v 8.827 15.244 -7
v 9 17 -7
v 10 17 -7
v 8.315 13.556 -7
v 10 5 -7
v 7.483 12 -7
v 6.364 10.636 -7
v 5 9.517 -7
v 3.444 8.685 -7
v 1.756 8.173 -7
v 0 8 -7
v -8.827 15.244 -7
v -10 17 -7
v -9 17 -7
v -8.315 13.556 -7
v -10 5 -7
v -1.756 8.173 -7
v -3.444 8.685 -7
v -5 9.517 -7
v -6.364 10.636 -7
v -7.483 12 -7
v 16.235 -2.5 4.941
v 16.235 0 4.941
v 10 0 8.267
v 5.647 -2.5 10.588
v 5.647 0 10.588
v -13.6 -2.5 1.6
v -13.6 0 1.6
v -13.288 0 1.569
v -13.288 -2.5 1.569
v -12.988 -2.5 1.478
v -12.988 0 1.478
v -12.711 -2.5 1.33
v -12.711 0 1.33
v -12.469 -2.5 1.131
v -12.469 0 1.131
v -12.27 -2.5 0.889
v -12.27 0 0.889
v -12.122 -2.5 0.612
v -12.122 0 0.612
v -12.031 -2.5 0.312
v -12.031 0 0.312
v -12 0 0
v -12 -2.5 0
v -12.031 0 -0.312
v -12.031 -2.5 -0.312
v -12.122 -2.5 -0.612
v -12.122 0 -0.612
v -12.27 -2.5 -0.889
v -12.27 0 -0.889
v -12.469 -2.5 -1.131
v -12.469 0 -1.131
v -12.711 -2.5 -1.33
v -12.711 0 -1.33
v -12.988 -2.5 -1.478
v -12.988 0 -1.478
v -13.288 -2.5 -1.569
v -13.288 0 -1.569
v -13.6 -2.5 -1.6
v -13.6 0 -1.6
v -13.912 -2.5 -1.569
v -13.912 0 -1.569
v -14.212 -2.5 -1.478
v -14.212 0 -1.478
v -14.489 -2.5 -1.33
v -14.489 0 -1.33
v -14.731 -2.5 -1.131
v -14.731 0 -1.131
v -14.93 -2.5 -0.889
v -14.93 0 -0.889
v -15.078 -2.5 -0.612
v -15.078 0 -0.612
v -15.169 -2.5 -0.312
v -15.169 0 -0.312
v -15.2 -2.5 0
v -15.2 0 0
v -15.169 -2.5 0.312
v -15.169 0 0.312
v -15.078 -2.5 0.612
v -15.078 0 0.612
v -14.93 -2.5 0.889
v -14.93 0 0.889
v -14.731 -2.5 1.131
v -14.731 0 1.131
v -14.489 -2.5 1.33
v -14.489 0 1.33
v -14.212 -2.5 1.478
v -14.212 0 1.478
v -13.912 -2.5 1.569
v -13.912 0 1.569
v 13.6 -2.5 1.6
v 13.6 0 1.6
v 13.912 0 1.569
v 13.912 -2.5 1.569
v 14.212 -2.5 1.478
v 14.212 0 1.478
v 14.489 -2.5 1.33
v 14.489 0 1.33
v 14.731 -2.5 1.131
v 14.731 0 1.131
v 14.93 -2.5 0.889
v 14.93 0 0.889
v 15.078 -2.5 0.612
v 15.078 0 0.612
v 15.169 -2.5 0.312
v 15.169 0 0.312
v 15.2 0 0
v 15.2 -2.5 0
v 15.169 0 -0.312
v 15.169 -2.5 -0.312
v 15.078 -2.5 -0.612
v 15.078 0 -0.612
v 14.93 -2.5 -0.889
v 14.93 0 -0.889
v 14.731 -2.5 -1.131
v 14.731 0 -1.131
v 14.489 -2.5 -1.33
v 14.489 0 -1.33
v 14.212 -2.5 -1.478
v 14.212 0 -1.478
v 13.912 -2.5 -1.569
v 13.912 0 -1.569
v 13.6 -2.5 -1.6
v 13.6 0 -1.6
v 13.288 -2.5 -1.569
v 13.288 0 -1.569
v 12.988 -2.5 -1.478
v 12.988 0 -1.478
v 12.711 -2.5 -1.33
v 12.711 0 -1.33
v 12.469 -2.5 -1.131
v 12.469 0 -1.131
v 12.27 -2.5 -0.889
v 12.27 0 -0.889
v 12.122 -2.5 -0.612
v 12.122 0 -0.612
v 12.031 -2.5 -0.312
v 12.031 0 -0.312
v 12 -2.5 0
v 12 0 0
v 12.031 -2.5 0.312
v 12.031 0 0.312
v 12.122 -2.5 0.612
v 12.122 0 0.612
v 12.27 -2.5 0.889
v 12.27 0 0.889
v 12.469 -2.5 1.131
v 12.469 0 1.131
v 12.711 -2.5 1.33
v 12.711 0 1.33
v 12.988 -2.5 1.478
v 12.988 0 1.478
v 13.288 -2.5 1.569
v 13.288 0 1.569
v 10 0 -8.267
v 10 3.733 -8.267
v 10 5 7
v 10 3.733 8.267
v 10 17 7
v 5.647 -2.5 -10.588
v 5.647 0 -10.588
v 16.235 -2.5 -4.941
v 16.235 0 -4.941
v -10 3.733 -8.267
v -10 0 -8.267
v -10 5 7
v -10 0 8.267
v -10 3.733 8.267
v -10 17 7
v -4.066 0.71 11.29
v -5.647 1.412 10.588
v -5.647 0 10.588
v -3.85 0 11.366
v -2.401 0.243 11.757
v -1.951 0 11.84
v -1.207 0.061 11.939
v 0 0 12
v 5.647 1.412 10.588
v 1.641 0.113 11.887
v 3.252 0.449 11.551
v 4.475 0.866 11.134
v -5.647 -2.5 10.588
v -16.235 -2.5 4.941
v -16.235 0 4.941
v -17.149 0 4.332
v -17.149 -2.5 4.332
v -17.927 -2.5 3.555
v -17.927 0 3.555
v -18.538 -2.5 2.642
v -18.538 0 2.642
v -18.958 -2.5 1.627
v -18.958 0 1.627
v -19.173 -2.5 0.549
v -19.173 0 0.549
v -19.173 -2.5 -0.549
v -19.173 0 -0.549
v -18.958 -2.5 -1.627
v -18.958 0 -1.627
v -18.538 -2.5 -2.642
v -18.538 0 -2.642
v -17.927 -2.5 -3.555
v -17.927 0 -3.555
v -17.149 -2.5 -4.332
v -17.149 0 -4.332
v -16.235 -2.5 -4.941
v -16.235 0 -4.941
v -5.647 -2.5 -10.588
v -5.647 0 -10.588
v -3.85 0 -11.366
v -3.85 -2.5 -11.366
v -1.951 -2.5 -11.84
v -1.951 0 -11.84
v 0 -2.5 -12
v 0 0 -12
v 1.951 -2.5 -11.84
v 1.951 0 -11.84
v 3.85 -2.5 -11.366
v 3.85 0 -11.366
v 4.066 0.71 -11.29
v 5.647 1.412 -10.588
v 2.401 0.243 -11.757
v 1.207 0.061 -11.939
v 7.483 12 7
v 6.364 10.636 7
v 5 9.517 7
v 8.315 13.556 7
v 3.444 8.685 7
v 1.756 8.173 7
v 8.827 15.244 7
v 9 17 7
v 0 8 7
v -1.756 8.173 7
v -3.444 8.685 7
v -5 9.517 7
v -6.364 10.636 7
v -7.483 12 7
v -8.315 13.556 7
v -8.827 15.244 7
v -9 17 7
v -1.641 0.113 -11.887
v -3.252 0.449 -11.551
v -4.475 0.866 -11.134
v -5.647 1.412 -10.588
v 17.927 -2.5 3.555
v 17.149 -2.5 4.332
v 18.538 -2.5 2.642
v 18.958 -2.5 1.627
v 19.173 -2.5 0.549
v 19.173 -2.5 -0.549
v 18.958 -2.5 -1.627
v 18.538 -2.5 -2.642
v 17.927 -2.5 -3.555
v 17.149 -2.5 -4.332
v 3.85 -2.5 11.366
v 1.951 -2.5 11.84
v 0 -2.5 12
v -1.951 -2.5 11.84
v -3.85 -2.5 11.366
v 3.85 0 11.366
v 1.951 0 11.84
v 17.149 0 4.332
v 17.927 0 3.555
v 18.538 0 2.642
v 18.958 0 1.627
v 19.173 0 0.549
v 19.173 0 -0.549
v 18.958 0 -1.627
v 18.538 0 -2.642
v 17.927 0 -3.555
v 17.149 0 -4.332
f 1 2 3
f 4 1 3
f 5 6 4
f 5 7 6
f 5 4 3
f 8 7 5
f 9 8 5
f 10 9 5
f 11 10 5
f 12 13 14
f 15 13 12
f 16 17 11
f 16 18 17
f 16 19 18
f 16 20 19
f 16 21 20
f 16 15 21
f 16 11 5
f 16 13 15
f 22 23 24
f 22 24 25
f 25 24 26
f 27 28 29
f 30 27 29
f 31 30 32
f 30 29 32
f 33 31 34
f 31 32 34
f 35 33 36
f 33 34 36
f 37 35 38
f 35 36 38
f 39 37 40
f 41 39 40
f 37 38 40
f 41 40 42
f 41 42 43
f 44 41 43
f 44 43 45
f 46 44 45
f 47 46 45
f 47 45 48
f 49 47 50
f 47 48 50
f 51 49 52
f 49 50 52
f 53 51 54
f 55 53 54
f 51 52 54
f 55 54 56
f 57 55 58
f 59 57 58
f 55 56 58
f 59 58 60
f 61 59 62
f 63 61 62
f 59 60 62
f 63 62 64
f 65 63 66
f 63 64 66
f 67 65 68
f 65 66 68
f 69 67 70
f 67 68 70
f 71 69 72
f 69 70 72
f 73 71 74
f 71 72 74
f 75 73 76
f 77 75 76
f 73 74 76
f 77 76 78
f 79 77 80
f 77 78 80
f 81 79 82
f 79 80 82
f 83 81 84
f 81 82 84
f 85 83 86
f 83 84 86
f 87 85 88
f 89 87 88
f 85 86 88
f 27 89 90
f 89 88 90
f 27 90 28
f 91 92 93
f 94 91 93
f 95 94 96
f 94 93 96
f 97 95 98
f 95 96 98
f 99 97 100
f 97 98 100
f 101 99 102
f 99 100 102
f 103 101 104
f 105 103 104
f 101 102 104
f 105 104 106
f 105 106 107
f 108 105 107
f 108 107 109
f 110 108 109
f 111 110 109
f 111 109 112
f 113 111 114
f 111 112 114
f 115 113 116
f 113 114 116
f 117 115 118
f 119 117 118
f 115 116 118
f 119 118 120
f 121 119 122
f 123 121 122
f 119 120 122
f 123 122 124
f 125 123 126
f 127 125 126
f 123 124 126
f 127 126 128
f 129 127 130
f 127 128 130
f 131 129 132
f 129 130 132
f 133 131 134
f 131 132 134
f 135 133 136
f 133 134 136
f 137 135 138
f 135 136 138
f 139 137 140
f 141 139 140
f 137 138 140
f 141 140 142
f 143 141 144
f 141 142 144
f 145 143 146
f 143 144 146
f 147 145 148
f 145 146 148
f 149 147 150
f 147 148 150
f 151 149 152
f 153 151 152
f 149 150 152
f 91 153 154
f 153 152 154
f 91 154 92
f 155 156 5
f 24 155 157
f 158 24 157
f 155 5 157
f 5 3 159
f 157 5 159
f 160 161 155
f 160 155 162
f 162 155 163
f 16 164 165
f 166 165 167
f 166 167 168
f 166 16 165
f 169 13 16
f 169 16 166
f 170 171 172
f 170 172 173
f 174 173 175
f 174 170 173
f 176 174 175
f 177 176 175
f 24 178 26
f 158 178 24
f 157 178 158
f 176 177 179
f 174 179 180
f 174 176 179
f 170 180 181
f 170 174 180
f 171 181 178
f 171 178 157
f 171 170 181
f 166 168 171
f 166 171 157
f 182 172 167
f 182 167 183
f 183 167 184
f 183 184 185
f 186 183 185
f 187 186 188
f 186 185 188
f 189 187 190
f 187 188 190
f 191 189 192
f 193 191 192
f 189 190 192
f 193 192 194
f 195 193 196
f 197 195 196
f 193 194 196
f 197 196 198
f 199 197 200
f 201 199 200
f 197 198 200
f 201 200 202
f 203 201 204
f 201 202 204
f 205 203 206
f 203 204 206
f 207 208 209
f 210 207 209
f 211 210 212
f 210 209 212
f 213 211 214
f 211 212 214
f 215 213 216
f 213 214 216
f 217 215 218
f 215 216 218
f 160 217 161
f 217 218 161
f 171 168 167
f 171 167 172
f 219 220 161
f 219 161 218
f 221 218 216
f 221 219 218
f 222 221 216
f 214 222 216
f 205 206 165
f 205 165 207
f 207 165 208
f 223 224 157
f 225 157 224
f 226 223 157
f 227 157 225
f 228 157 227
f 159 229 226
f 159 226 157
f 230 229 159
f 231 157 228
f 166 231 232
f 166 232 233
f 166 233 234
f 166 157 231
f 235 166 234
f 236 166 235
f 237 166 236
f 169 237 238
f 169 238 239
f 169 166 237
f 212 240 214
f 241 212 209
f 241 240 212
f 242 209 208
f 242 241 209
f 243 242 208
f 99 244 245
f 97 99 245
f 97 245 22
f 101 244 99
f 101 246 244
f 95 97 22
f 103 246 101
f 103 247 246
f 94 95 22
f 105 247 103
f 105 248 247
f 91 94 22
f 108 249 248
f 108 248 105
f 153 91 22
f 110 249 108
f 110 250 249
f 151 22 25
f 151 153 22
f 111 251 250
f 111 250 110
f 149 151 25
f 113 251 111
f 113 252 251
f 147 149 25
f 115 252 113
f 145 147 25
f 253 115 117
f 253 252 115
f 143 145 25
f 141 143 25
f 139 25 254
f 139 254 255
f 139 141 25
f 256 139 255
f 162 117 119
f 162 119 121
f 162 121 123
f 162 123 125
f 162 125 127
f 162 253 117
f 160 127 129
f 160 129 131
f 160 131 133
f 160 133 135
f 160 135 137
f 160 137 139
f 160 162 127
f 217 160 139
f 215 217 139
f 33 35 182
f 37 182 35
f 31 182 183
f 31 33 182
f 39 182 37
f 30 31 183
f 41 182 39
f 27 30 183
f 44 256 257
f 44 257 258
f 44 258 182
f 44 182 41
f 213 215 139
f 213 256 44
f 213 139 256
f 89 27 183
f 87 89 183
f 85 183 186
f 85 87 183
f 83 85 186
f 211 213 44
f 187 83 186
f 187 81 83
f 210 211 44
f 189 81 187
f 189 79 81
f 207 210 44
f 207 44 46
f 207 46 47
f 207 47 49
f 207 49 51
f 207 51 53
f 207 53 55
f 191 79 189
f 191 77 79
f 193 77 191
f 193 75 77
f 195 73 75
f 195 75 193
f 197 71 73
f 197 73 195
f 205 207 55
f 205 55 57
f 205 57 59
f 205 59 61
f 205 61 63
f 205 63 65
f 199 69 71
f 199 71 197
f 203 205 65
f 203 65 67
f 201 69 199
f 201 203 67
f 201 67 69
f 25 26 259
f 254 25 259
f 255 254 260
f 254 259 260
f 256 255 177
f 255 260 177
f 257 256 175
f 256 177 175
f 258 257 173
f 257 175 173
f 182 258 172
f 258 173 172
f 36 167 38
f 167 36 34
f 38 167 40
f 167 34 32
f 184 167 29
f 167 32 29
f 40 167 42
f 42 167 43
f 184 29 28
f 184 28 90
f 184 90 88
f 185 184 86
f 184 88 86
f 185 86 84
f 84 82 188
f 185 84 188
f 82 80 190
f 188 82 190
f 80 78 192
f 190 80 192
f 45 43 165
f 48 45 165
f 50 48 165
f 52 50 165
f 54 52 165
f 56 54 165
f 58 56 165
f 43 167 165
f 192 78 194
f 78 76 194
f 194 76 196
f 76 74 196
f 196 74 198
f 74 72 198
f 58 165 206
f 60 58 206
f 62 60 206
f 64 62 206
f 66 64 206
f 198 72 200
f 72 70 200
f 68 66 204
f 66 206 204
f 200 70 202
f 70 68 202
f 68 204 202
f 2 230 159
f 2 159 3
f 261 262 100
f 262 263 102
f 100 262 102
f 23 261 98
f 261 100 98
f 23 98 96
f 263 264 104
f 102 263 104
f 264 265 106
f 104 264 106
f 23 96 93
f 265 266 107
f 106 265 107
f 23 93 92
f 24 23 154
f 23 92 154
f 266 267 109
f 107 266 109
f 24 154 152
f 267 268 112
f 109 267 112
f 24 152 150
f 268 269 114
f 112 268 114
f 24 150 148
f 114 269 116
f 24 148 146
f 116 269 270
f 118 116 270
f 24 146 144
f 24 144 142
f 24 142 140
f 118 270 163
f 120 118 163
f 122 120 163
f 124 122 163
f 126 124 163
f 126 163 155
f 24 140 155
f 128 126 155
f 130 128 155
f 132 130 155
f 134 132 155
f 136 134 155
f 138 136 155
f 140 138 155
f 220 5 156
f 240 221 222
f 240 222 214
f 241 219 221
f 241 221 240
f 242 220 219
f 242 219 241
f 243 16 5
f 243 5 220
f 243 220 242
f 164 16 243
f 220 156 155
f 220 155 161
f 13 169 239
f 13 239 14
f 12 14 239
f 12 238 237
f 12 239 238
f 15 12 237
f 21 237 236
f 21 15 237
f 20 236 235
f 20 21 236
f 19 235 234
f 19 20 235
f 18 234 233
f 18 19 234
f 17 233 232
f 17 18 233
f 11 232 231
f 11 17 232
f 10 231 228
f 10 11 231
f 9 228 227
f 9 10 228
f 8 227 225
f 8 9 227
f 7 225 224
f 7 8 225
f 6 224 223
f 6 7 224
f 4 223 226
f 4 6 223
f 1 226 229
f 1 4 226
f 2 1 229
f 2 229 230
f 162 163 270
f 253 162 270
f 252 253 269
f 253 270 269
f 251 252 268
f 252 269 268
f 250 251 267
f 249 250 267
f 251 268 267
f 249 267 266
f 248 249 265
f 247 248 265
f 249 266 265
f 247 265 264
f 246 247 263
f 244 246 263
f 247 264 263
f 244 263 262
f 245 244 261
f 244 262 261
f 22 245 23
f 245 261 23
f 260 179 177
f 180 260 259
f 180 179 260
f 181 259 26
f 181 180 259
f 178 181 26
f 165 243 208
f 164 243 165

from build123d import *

# Parameters (mm, degrees)
SKETCH_1_R               = 1.6
EXTRUDE_1_DEPTH          = 2.5
EXTRUDE_2_DEPTH          = 10
EXTRUDE_2_DEPTH_BACK     = 10
CUT_EXTRUDE_START        = 12
SKETCH_4_R               = 25
CUT_EXTRUDE_3_DEPTH      = 12
CUT_EXTRUDE_4_DEPTH      = 12
CUT_EXTRUDE_4_DEPTH_BACK = 12
SKETCH_5_R               = 9


with BuildPart() as part:
    # 草图1 → 凸台-拉伸1 (new body)
    with BuildSketch(Plane(origin=(0, 0, 0), x_dir=(1, 0, 0), z_dir=(0, 1, 0))):
        with BuildLine():
            Line((16.235294118, -4.941176471), (5.647058824, -10.588235294))
            ThreePointArc((5.647058824, -10.588235294), (0, -12), (-5.647058824, -10.588235294))
            Line((-5.647058824, -10.588235294), (-16.235294118, -4.941176471))
            ThreePointArc((-16.235294118, -4.941176471), (-19.2, 0), (-16.235294118, 4.941176471))
            Line((-16.235294118, 4.941176471), (-5.647058824, 10.588235294))
            ThreePointArc((-5.647058824, 10.588235294), (0, 12), (5.647058824, 10.588235294))
            Line((5.647058824, 10.588235294), (16.235294118, 4.941176471))
            ThreePointArc((16.235294118, 4.941176471), (19.2, 0), (16.235294118, -4.941176471))
        make_face()
        with Locations((-13.6, 0)):
            Circle(SKETCH_1_R, mode=Mode.SUBTRACT)
        with Locations((13.6, 0)):
            Circle(SKETCH_1_R, mode=Mode.SUBTRACT)
    extrude(amount=-EXTRUDE_1_DEPTH)

    # 草图2 → 凸台-拉伸2 (add, two sides: drawn at the far end of the back side and taken through both)
    with BuildSketch(Plane(origin=(0, 0, 0), x_dir=(0, 0, -1), z_dir=(1, 0, 0)).offset(-EXTRUDE_2_DEPTH_BACK)):
        Polygon((12, 0), (-12, 0), (-7, 5), (-7, 17), (7, 17), (7, 5), align=None)
    extrude(amount=EXTRUDE_2_DEPTH + EXTRUDE_2_DEPTH_BACK)

    # 草图4 → 切除-拉伸3 (cut)
    with BuildSketch(Plane(origin=(0, 0, 0), x_dir=(1, 0, 0), z_dir=(0, 1, 0)).offset(CUT_EXTRUDE_START)):
        Circle(SKETCH_4_R)
        with BuildLine():
            Line((5.647058824, -10.588235294), (10, -8.266666667))
            Line((10, -8.266666667), (16.235294118, -4.941176471))
            ThreePointArc((16.235294118, -4.941176471), (19.2, 0), (16.235294118, 4.941176471))
            Line((16.235294118, 4.941176471), (10, 8.266666667))
            Line((10, 8.266666667), (5.647058824, 10.588235294))
            ThreePointArc((5.647058824, 10.588235294), (2.9104275, 11.641710002), (0, 12))
            ThreePointArc((0, 12), (-2.9104275, 11.641710002), (-5.647058824, 10.588235294))
            Line((-5.647058824, 10.588235294), (-10, 8.266666667))
            Line((-10, 8.266666667), (-16.235294118, 4.941176471))
            ThreePointArc((-16.235294118, 4.941176471), (-19.2, 0), (-16.235294118, -4.941176471))
            Line((-16.235294118, -4.941176471), (-10, -8.266666667))
            Line((-10, -8.266666667), (-5.647058824, -10.588235294))
            ThreePointArc((-5.647058824, -10.588235294), (-2.9104275, -11.641710002), (0, -12))
            ThreePointArc((0, -12), (2.9104275, -11.641710002), (5.647058824, -10.588235294))
        make_face(mode=Mode.SUBTRACT)
    extrude(amount=-CUT_EXTRUDE_3_DEPTH, mode=Mode.SUBTRACT)

    # 草图5 → 切除-拉伸4 (cut, two sides: drawn at the far end of the back side and taken through both)
    with BuildSketch(Plane.XY.offset(-CUT_EXTRUDE_4_DEPTH_BACK)):
        with Locations((0, 17)):
            Circle(SKETCH_5_R)
    extrude(amount=CUT_EXTRUDE_4_DEPTH + CUT_EXTRUDE_4_DEPTH_BACK, mode=Mode.SUBTRACT)


solid = part.part
